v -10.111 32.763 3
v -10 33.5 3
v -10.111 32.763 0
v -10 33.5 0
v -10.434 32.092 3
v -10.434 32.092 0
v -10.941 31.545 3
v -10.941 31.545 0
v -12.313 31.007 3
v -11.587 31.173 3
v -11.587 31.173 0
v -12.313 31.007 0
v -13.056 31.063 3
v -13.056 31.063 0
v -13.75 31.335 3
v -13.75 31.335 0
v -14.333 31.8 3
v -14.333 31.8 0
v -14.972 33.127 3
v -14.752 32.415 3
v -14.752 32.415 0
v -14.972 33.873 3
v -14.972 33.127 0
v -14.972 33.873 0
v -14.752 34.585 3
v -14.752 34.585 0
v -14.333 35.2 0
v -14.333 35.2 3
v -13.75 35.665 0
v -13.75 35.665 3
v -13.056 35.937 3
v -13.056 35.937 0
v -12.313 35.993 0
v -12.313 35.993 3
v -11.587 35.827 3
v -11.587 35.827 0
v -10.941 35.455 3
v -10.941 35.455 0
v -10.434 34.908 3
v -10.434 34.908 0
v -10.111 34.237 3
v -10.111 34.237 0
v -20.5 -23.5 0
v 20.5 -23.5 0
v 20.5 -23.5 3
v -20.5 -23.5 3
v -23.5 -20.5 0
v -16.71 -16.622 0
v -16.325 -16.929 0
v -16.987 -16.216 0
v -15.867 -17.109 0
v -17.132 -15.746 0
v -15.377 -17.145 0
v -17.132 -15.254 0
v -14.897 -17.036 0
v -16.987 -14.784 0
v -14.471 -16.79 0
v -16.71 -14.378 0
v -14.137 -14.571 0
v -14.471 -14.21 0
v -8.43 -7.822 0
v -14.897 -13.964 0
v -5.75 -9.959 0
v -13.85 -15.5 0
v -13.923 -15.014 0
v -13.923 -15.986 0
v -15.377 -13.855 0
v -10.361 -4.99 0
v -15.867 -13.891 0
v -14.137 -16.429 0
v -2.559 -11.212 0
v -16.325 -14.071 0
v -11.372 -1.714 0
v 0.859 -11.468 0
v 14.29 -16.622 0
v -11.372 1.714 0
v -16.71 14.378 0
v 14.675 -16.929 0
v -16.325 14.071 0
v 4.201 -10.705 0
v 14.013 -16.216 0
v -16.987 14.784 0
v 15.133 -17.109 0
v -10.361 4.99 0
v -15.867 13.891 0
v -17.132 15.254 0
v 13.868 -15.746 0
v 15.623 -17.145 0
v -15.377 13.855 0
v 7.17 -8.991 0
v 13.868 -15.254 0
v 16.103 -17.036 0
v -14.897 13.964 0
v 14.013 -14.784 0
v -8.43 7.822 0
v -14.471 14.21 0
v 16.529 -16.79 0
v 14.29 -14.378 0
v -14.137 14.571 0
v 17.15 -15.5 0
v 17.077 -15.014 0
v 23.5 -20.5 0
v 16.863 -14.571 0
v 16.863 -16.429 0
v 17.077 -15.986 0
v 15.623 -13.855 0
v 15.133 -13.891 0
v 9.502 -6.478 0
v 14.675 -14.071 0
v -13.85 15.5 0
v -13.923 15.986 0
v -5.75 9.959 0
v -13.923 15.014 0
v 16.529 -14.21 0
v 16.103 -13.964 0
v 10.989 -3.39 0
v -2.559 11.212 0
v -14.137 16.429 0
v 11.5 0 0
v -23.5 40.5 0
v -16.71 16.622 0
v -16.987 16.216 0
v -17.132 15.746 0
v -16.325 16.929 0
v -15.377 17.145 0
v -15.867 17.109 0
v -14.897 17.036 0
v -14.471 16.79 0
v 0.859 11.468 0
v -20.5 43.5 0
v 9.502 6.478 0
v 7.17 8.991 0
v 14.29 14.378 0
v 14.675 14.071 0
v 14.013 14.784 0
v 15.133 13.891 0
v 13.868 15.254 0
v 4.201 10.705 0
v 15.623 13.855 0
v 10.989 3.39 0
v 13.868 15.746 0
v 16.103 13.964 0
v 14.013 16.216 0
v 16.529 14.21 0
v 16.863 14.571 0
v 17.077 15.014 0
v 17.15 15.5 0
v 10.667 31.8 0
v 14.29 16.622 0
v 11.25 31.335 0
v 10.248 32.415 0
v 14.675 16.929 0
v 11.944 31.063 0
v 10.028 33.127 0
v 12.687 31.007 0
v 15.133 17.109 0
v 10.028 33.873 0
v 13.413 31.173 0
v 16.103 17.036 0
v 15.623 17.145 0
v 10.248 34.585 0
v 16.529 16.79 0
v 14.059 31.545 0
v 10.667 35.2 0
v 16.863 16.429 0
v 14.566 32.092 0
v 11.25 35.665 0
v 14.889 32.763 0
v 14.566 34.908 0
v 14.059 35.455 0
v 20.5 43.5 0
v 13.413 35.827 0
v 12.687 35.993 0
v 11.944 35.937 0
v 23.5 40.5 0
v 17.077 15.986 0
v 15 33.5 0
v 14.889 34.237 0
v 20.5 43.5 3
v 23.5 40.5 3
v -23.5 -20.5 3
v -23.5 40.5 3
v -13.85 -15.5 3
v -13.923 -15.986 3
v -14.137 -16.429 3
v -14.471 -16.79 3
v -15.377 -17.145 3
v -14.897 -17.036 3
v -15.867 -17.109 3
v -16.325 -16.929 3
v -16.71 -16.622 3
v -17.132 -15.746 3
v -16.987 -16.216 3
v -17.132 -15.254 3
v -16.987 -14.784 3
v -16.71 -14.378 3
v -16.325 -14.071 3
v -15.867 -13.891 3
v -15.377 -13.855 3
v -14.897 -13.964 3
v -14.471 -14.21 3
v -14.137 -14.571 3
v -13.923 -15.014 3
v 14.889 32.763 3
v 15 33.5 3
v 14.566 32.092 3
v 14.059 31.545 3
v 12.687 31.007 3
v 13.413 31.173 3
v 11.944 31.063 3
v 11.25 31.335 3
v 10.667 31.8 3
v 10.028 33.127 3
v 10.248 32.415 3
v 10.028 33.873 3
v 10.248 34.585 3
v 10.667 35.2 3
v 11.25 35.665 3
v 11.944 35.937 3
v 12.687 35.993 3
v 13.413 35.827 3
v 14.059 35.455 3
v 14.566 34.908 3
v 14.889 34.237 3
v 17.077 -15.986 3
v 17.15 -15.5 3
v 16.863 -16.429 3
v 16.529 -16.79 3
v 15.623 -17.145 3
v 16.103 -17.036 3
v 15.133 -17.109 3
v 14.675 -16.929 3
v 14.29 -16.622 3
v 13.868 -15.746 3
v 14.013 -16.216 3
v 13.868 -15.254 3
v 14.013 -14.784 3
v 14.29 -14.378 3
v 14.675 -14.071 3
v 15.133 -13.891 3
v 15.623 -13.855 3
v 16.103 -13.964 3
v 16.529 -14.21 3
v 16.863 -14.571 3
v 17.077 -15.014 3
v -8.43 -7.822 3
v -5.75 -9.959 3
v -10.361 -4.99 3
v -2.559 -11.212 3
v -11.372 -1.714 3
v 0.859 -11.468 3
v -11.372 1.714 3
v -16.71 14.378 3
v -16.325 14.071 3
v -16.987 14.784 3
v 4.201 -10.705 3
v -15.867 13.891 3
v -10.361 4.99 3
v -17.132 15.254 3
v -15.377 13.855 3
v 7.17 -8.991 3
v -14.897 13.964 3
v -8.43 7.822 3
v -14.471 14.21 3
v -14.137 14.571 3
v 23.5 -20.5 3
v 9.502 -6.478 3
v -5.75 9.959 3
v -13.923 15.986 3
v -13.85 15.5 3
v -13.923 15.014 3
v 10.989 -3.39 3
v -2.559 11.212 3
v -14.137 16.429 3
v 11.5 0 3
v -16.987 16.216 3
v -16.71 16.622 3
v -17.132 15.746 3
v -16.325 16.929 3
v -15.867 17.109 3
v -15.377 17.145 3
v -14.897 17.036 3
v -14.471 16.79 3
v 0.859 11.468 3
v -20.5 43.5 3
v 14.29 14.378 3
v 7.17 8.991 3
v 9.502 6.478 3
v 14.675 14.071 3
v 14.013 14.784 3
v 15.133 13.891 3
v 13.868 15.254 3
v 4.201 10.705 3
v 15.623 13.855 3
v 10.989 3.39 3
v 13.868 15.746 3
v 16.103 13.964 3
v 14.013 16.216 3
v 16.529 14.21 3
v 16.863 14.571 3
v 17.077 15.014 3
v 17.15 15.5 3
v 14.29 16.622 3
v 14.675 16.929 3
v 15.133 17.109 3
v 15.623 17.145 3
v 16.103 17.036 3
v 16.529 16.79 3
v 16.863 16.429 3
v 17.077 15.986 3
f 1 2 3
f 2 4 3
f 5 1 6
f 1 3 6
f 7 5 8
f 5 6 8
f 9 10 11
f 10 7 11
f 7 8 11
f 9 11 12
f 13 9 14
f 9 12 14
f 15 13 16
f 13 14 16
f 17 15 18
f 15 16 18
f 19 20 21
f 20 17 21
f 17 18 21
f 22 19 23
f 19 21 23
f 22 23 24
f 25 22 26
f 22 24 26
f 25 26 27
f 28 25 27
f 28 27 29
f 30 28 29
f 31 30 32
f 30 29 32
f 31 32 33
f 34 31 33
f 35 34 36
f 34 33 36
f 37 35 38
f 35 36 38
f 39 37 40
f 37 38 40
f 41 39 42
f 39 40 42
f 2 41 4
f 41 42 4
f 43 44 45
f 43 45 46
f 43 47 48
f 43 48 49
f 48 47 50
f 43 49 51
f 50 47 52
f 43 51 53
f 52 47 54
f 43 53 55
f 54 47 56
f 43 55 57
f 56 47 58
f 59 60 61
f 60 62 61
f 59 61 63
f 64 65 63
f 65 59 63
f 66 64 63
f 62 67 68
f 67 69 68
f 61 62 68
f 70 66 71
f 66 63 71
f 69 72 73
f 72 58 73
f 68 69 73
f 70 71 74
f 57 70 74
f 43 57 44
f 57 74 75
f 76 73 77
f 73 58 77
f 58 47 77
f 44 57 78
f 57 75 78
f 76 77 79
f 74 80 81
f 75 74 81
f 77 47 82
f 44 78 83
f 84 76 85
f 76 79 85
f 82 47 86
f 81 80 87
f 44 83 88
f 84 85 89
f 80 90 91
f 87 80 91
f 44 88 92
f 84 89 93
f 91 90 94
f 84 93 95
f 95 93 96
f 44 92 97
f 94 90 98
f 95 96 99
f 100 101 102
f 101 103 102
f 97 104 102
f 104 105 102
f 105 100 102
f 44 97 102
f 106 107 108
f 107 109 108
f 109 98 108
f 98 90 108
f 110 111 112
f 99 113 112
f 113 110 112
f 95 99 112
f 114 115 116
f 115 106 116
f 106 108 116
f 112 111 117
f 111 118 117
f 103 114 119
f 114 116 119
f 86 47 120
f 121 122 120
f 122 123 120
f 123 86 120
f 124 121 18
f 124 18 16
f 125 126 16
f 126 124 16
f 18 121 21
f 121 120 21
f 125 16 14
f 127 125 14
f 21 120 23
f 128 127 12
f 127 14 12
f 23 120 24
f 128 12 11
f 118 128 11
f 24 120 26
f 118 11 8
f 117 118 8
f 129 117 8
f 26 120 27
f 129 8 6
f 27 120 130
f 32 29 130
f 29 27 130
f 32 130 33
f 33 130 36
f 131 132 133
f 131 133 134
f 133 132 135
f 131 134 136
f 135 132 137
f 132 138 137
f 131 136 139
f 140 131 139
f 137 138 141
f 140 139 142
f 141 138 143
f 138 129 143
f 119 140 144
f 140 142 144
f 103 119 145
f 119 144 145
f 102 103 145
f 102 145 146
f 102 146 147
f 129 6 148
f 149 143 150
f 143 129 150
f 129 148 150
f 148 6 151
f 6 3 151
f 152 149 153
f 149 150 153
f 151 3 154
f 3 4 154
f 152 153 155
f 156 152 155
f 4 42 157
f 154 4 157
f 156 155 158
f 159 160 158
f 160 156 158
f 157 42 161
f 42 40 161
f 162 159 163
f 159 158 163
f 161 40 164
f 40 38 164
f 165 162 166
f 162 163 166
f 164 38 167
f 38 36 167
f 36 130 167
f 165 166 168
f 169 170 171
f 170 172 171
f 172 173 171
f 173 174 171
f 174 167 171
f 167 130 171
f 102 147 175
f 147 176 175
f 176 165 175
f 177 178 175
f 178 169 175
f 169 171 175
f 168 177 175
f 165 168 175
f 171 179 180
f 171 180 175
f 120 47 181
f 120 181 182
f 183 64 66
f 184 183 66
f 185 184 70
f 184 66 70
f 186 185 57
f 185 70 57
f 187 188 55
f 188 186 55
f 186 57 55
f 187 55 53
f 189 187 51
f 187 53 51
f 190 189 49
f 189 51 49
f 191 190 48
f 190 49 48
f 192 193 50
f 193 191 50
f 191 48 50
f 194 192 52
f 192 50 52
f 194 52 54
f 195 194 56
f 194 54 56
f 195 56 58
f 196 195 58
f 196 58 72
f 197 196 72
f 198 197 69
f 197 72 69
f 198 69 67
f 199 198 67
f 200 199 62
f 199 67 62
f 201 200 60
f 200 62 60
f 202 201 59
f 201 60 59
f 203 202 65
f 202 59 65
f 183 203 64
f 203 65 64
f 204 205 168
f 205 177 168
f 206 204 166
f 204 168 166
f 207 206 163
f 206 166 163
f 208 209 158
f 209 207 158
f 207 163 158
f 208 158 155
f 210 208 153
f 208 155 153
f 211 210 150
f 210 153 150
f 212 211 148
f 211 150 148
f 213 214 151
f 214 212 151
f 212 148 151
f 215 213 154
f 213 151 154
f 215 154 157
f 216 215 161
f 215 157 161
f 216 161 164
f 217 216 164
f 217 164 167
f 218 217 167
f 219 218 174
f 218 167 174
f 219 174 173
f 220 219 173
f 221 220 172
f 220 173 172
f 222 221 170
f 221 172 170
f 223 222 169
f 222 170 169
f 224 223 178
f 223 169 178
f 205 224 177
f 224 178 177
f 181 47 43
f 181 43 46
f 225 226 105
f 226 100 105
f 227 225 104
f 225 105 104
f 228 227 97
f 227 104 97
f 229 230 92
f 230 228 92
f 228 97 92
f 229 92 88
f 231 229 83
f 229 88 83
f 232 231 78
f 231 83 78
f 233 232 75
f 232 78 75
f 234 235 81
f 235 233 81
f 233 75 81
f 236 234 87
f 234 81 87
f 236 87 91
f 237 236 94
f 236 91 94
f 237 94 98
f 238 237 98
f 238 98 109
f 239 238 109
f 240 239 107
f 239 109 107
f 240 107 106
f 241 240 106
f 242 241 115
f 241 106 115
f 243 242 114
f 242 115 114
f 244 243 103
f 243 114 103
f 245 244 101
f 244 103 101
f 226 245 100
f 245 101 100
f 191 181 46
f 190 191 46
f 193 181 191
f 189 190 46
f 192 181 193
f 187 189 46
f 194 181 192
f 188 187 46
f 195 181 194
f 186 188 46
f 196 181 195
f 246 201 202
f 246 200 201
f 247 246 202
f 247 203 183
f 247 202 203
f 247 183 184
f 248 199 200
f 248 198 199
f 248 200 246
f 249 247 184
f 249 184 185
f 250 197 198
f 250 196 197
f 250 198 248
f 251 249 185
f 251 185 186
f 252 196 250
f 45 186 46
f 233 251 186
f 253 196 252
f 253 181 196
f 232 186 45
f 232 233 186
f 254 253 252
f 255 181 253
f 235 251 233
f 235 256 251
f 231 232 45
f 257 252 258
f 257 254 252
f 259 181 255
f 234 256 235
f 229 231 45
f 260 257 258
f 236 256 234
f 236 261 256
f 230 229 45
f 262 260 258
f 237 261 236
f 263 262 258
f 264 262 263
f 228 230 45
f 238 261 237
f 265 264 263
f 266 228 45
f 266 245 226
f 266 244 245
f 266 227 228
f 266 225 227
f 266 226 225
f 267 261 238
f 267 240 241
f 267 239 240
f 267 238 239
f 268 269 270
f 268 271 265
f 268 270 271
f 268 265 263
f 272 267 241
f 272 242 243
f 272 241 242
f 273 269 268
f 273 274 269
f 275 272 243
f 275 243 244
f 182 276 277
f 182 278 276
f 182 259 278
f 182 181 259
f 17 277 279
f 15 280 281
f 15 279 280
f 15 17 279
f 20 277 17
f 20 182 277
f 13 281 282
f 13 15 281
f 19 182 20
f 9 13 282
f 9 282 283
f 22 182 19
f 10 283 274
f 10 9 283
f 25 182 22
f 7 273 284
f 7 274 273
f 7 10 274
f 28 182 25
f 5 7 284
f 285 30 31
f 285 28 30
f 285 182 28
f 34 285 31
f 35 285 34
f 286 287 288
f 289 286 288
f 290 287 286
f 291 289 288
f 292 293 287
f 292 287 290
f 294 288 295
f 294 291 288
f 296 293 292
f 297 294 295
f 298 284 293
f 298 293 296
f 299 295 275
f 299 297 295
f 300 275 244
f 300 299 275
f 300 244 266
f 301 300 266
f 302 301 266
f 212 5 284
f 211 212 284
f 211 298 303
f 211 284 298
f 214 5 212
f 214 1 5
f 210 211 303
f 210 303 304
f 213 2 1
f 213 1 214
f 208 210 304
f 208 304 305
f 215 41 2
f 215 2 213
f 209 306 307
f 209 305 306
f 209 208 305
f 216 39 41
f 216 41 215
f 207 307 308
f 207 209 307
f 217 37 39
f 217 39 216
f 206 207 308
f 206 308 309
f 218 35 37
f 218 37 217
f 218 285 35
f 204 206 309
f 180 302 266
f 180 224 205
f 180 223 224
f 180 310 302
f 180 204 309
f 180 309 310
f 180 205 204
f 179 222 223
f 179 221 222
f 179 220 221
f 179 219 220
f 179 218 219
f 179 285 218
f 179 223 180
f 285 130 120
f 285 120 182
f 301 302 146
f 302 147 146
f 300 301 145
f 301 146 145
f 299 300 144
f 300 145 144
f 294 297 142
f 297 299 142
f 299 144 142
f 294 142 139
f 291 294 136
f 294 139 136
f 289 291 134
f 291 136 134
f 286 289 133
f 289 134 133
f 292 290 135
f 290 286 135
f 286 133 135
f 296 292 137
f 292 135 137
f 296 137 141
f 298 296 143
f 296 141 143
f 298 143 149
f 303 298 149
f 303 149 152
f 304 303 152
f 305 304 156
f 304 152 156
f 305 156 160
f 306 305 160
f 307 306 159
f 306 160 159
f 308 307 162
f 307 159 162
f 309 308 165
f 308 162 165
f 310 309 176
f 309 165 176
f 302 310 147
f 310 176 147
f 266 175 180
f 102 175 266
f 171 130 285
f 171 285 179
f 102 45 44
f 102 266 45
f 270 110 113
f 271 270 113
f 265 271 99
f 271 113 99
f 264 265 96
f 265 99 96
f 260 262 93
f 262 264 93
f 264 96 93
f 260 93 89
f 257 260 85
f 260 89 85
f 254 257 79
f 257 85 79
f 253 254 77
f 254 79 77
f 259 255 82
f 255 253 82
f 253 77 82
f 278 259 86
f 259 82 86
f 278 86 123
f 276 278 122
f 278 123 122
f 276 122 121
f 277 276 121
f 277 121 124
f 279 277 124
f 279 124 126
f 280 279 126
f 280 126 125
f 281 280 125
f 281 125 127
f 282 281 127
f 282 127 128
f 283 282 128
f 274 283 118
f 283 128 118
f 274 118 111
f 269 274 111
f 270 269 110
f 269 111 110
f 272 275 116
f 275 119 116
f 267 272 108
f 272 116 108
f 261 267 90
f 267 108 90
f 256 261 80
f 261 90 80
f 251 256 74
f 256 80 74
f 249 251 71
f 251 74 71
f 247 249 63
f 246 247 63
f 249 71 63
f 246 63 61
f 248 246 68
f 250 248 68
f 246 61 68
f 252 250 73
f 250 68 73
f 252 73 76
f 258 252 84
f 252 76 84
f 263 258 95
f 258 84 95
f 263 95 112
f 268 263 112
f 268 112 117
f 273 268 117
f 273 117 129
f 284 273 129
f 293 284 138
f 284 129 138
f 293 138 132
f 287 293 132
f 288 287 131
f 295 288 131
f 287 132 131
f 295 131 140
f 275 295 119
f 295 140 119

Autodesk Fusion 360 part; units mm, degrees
sketch "Skizze1" plane through (0, 0, 0) normal (0, 0, 1) x (1, 0, 0)
  circle A0 centre (0, 0) radius 11.5
  line L0 (23.5, -23.5) -> (-23.5, -23.5)
  line L1 (-23.5, -23.5) -> (-23.5, 23.5)
  line L2 (-23.5, 23.5) -> (23.5, 23.5)
  line L3 (23.5, 23.5) -> (23.5, -23.5)
  line L4 (23.5, -23.5) -> (-23.5, 23.5) construction
  line L5 (-23.5, -23.5) -> (23.5, 23.5) construction
  line L6 (21.5, -21.5) -> (-21.5, -21.5) construction
  line L7 (-21.5, -21.5) -> (-21.5, 21.5) construction
  line L8 (-21.5, 21.5) -> (21.5, 21.5) construction
  line L9 (21.5, 21.5) -> (21.5, -21.5) construction
  line L10 (21.5, -21.5) -> (-21.5, 21.5) construction
  line L11 (-21.5, -21.5) -> (21.5, 21.5) construction
  line L12 (15.5, -15.5) -> (-15.5, -15.5) construction
  line L13 (-15.5, -15.5) -> (-15.5, 15.5) construction
  line L14 (-15.5, 15.5) -> (15.5, 15.5) construction
  line L15 (15.5, 15.5) -> (15.5, -15.5) construction
  line L16 (15.5, -15.5) -> (-15.5, 15.5) construction
  line L17 (-15.5, -15.5) -> (15.5, 15.5) construction
  circle A1 centre (-15.5, 15.5) radius 1.65
  circle A2 centre (15.5, 15.5) radius 1.65
  circle A3 centre (15.5, -15.5) radius 1.65
  circle A4 centre (-15.5, -15.5) radius 1.65
  line L18 (-23.5, 23.5) -> (-23.5, 43.5)
  line L19 (-23.5, 43.5) -> (23.5, 43.5)
  line L20 (23.5, 43.5) -> (23.5, 23.5)
  line L21 (-23.5, 33.5) -> (23.5, 33.5) construction
  circle A5 centre (-12.5, 33.5) radius 2.5
  circle A6 centre (12.5, 33.5) radius 2.5
  line L22 (0, 1.75) -> (0, 22.5)
  dimension "d120" = 43
  dimension "d121" = 23
  dimension "d122" = 2
  dimension "d123" = 31
  dimension "d124" = 3.3
  dimension "d125" = 2
  dimension "d126" = 20
  dimension "d127" = 5
  dimension "d128" = 25
extrude "Extrusion1" add sketch "Skizze1" along normal blind 3
chamfer "Fase1" distance 3 angle 45 4 edges at (-23.5, -23.5, 1.5) (23.5, -23.5, 1.5) (23.5, 43.5, 1.5) (-23.5, 43.5, 1.5)
equation "frame_outer_x = 400 mm"
equation "frame_outer_y = 400 mm"
equation "frame_outer_z = 600 mm"
equation "M3_hole_dia = 3.5 mm"
equation "M4_hole_dia = 4.5 mm"
equation "M5_hole_dia = 5.2 mm"
equation "M6_hole_dia = 6.2 mm"
equation "M3_hole_dia_thread = 2.6 mm"
equation "M4_hole_dia_thread = 3.4 mm"
equation "M5_hole_dia_thread = 4.3 mm"
equation "M6_hole_dia_thread = 5.2 mm"
equation "M3_head_dia = 6 mm"
equation "M4_head_dia = 7 mm"
equation "M5_head_dia = 9 mm"
equation "M6_head_dia = 11 mm"
equation "M3_head_height = 3 mm"
equation "M4_head_height = 4 mm"
equation "M5_head_height = 5 mm"
equation "M6_head_height = 6 mm"
equation "nema_17_outer_XY = 43 mm"
equation "nema_17_outer_z = 40 mm"
equation "nema_17_screw_distance = 31 mm"
equation "nema_17_center_ring_dia = 23 mm"
equation "nema_17_center_ring_height = 2 mm"
equation "nema_17_shaft_length = 24 mm"
equation "nema_17_shaft_dia = 5 mm"
equation "lm8uu_outer_dia = 15 mm"
equation "lm8uu_length = 24 mm"
equation "lm8uu_nut_distance_cc = 16.4 mm"
equation "scs8uu_lenght = 30 mm"
equation "scs8uu_width = 34.4 mm"
equation "scs8uu_screw_distance_cc_1 = 18 mm"
equation "scs8uu_screw_distance_cc_2 = 24 mm"
equation "scs8uu_base_road_cc = 11 mm"
equation "scs8uu_screw_hole_dia = 4 mm"
equation "lmk8luu_length = 45 mm"
equation "lmk8luu_head_xy = 25 mm"
equation "lmk8luu_body_dia = 15 mm"
equation "lmk8luu_circle_holes_dia = 24 mm"
equation "lmk8luu_screw_hole_dia = 3 mm"
equation "kp08_screw_distance_cc = 42 mm"
equation "kp08_base_road_cc = 15 mm"
equation "kp08_screw_hole_dia = 4 mm"
equation "sk8_screw_distance_cc = 32 mm"
equation "sk8_base_road_cc = 20 mm"
equation "sk8_screw_hole_dia = 5 mm"
equation "trapezoidal_screw_z_length = 300 mm"
equation "coupler_5x8_length = 25 mm"
equation "coupler_5x8_outer_dia = 19 mm"
equation "t8_nut_outer_dia_1 = 22 mm"
equation "t8_nut_outer_dia_2 = 10.2 mm"
equation "t8_nut_screw_hole_dia = 3 mm"
equation "t8_nut_screw_circle_holes_dia = 16 mm"
equation "heatbed_outer_x = 220 mm"
equation "heatbed_outer_y = 220 mm"
equation "heatbed_x_srew_cc = 210 mm"
equation "heatbed_y_srew_cc = 210 mm"
equation "x_rods_distance_cc = 40 mm"
equation "y_rods_distance_cc = 140 mm"
equation "z_rods_distance_cc = 300 mm"
equation "steel_rods_dia = 8.2 mm"
equation "x_profile_distance_cc = 60 mm"
equation "y_profile_distance_cc = 160 mm"
equation "z_profile_distance_cc = 300 mm"
equation "x_profile_length = 300 mm"
equation "y_profile_length = 300 mm"
equation "z_profile_length = 300 mm"
equation "y_profile_xy = 20 mm"
equation "z_profil_x = 20 mm"
equation "z_profil_y = 40 mm"
equation "profil_nut_width = 6 mm"
equation "profil_nut_depth = 5 mm"
equation "pulley_gt2_20t_outer_dia = 16 mm"
equation "pulley_gt2_20t_inner_dia = 12.2 mm"
equation "pulley_gt2_16t_outer_dia = 13.8 mm"
equation "pulley_gt2_16t_inner_dia = 9.4 mm"
equation "e3d_heigh_all = 62.3 mm"
equation "e3d_mounting_dia_inner = 12 mm"
equation "e3d_mounting_dia_outer = 16 mm"
equation "e3d_mounting_height = 6 mm"
equation "e3d_upper_mount_height = 3.7 mm"
equation "e3d_distance_nozzle_mounting_center = e3d_heigh_all - ( e3d_mounting_height / 2 ) - e3d_upper_mount_height"
equation "f624_zz_outer_dia = 15 mm"
equation "f624_zz_inner_dia = 13 mm"
equation "f624_zz_hole_dia = 4 mm"
equation "f623_zz_outer_dia = 11.5 mm"
equation "f623_zz_inner_dia = 10 mm"
equation "f623_zz_hole_dia = 3 mm"
equation "fan_30x30_xy_outside = 30 mm"
equation "fan_30x30_xy_screw_distance = 24 mm"
equation "fan_30x30_fan_opening_dia = 28 mm"
equation "fan_40x40_xy_outside = 40 mm"
equation "fan_40x40_xy_screw_distance = 32 mm"
equation "fan_40x40_fan_opening_dia = 38 mm"
equation "fan_50x50_xy_outside = 50 mm"
equation "fan_50x50_xy_screw_distance = 40 mm"
equation "fan_50x50_fan_opening_dia = 47 mm"
equation "fan_60x60_xy_outside = 60 mm"
equation "fan_60x60_xy_screw_distance = 51 mm"
equation "fan_60x60_fan_opening_dia = 57 mm"
equation "fan_12x120_xy_outside = 120 mm"
equation "fan_12x120_xy_screw_distance = 105 mm"
equation "fan_12x120_fan_opening_dia = 116 mm"
equation "d120 = nema_17_outer_XY"
equation "d121 = nema_17_center_ring_dia"
equation "d123 = nema_17_screw_distance"
